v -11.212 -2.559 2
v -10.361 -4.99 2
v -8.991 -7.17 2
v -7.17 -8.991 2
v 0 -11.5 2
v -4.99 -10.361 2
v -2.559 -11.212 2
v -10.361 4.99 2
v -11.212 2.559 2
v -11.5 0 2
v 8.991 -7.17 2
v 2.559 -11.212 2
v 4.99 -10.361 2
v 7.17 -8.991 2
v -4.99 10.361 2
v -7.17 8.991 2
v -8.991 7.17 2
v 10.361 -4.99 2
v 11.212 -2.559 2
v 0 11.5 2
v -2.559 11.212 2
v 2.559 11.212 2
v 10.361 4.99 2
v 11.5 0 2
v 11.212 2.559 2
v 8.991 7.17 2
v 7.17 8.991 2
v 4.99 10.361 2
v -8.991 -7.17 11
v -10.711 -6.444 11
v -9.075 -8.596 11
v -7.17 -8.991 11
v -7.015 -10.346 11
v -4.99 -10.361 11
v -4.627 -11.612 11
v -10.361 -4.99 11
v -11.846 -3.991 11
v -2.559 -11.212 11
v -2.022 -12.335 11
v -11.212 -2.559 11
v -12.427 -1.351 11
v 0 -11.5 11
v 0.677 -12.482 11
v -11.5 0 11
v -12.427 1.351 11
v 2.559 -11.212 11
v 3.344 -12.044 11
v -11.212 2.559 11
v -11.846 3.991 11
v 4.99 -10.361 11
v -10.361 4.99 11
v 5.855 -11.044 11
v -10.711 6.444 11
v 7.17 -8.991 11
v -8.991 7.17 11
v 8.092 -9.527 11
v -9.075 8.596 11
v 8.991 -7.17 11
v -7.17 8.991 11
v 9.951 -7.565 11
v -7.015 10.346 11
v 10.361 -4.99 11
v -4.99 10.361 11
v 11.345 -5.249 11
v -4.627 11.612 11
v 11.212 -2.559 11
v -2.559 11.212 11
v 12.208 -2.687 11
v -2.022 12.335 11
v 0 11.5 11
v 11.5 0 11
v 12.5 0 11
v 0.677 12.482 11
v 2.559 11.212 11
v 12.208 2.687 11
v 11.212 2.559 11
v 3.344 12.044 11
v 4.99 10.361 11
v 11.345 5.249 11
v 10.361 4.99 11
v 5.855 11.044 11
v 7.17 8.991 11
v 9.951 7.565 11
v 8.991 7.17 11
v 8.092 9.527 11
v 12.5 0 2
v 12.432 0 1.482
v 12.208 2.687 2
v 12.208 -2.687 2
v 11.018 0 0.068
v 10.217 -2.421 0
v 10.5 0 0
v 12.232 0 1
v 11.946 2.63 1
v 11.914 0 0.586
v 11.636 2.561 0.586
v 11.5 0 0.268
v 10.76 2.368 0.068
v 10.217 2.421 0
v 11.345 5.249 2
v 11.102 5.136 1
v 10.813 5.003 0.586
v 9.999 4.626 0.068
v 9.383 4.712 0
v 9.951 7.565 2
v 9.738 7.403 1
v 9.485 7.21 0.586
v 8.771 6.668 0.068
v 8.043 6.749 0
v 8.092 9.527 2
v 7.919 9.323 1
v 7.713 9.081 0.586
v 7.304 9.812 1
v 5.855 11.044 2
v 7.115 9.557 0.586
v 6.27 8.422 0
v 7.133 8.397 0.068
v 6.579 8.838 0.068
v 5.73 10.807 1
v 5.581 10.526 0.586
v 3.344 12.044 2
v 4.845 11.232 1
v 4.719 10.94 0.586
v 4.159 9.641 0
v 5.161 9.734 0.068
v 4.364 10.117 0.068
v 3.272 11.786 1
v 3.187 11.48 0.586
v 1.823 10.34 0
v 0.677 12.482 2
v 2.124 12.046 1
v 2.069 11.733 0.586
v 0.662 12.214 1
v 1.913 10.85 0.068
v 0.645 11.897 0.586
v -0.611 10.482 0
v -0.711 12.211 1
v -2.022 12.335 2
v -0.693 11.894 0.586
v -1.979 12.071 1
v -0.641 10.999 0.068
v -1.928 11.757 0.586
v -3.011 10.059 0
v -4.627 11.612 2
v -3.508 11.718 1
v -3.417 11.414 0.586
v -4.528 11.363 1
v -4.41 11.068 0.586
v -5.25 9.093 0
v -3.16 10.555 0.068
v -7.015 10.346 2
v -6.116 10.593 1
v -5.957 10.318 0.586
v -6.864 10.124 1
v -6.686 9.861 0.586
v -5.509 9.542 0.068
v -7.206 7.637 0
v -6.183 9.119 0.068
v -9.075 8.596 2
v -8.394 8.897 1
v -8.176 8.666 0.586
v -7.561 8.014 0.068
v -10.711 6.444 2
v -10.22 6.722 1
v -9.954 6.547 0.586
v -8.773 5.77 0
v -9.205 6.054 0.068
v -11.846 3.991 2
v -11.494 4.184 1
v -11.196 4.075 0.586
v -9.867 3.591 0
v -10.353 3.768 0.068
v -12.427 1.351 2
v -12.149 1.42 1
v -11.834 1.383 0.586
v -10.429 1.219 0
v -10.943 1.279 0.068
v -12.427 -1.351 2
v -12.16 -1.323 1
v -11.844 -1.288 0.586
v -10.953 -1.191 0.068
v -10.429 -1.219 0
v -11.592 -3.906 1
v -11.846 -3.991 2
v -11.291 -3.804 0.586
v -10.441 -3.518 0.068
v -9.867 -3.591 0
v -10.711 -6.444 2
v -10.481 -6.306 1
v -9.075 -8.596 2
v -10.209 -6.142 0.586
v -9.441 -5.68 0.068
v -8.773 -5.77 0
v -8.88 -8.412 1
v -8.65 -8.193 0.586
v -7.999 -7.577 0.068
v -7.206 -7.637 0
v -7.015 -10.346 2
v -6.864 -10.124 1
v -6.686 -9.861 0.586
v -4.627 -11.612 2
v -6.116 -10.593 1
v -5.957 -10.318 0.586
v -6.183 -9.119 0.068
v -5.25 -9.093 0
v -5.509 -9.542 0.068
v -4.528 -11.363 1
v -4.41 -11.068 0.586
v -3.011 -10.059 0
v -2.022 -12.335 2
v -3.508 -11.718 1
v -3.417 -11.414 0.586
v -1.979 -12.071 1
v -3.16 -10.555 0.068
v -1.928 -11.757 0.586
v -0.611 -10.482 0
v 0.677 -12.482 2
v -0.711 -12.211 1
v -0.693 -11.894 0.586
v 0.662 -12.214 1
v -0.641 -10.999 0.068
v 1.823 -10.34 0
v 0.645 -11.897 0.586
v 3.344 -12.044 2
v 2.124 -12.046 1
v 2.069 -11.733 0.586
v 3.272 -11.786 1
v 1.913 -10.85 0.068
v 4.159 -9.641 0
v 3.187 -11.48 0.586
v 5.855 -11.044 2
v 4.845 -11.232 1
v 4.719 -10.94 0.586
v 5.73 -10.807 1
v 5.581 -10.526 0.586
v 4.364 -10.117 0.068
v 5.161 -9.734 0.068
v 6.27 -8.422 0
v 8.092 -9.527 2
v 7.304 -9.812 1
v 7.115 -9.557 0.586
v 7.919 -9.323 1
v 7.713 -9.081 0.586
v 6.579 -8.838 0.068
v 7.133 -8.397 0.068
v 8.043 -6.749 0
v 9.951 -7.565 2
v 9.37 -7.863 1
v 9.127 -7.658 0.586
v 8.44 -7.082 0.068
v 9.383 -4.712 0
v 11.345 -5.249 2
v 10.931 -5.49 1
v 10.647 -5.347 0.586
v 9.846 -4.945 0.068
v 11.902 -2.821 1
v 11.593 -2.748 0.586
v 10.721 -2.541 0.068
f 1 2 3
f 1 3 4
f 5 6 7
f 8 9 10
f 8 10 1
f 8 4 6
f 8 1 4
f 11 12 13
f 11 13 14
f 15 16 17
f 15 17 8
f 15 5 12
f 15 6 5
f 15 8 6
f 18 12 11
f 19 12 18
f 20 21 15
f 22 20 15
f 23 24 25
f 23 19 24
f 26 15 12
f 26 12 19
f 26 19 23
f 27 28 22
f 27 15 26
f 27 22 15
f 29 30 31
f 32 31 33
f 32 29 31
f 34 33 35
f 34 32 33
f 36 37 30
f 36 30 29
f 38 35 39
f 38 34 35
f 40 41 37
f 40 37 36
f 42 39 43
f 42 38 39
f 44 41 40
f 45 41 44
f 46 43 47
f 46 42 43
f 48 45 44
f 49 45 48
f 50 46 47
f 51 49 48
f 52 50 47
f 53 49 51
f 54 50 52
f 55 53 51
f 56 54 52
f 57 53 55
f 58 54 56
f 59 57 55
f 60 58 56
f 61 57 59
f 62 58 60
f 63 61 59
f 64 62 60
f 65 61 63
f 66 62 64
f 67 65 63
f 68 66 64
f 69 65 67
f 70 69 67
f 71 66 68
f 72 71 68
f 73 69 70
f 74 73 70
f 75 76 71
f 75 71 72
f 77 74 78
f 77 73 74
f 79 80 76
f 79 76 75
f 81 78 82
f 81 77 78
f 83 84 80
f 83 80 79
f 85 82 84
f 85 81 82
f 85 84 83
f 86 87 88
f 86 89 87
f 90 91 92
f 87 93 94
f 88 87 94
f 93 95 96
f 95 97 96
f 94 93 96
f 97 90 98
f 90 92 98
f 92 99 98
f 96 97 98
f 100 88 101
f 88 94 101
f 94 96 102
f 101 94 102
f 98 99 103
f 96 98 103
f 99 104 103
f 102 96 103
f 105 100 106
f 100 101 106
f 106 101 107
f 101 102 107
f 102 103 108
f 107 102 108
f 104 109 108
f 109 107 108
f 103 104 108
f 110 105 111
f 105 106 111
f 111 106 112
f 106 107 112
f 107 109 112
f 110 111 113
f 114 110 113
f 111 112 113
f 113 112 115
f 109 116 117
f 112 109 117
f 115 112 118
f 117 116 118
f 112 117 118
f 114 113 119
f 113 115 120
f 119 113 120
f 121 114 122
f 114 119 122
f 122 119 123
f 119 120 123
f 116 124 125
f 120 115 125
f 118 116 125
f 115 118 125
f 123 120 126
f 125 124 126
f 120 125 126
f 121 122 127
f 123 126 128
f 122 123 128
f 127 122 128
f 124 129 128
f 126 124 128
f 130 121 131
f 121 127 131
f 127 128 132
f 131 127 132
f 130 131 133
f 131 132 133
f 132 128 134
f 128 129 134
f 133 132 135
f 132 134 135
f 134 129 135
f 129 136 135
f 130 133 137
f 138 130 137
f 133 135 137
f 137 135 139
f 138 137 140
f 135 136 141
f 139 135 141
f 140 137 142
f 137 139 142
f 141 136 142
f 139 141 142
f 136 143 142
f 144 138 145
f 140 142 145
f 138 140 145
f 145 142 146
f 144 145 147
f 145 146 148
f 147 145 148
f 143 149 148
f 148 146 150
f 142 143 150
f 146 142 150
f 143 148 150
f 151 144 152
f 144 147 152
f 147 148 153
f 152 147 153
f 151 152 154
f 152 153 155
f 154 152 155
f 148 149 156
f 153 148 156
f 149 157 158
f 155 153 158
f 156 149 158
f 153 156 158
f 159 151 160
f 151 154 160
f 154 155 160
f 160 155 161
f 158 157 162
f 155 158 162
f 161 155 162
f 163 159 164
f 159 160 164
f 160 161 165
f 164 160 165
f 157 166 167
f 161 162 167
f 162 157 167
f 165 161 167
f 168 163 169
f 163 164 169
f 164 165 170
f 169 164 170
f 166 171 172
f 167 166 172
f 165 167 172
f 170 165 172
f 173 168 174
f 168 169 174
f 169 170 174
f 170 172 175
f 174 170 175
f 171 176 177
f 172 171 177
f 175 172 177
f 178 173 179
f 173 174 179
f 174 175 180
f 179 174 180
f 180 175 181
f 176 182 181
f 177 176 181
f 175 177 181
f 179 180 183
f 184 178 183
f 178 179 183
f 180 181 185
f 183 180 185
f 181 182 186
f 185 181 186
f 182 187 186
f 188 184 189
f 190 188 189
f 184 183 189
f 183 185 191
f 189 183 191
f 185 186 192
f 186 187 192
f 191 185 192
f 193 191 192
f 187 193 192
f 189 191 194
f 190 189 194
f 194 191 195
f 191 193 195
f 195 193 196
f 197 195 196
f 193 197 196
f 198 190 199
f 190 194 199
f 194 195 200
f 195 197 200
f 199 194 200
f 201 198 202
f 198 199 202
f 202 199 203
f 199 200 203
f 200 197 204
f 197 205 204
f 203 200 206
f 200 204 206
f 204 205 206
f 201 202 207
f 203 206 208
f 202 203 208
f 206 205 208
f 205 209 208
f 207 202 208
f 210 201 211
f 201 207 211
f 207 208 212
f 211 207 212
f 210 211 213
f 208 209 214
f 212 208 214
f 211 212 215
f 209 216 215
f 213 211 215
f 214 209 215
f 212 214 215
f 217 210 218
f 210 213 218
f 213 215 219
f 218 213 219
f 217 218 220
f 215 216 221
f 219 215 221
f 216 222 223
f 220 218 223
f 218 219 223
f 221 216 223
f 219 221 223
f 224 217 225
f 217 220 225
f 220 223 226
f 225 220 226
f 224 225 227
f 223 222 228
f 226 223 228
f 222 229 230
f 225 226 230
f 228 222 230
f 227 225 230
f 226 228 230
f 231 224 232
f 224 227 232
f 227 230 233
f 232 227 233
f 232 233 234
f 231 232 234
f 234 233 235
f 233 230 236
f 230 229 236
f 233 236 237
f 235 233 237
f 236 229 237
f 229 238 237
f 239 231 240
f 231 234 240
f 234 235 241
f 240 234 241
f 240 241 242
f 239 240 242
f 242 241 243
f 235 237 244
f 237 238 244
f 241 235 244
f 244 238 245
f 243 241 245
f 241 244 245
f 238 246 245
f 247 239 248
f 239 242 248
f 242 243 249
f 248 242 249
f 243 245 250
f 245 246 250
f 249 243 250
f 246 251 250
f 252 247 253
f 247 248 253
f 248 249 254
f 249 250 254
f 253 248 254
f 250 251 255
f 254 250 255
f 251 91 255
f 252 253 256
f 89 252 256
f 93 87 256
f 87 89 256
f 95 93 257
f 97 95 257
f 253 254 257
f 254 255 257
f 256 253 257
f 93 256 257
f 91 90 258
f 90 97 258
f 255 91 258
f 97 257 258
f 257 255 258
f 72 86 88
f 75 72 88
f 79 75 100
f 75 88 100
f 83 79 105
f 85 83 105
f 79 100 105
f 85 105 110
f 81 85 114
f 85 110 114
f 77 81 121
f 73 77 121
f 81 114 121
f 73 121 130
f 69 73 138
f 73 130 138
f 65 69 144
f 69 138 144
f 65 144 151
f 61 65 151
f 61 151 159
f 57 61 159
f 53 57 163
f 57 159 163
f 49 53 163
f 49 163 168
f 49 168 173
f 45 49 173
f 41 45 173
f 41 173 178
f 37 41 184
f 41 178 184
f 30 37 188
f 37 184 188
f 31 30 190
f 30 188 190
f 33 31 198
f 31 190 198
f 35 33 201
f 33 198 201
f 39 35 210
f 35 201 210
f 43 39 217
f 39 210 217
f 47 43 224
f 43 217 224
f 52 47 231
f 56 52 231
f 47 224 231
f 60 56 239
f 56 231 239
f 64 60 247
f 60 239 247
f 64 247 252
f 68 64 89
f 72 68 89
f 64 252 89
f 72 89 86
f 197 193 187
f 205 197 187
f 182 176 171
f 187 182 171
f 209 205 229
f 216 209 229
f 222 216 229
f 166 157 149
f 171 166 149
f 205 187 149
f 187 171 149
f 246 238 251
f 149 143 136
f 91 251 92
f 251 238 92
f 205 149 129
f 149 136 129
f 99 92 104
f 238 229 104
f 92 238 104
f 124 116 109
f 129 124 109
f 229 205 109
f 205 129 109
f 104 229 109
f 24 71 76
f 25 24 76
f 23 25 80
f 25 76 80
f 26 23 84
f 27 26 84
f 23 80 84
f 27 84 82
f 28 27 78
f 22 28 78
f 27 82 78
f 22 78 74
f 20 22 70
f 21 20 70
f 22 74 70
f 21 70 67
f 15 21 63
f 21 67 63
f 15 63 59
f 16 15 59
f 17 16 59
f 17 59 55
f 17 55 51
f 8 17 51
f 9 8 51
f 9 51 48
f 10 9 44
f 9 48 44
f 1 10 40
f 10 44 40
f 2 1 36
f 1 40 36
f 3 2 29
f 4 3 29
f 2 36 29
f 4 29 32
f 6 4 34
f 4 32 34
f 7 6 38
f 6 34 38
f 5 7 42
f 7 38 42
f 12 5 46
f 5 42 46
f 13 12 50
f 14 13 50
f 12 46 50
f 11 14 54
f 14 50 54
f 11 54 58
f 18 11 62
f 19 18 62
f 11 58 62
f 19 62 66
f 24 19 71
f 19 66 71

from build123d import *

# Parameters (mm, degrees)
F0_R     = 12.5
F1_DEPTH = 11
F2_R     = 11.5
F3_DEPTH = 9
F4_R     = 2


with BuildPart() as f1:
    # F0 (on Top) → F1 (new body)
    with BuildSketch(Plane.XY):
        Circle(F0_R)
    extrude(amount=F1_DEPTH)

    # F2 (on face) → F3 (cut)
    with BuildSketch(Plane.XY.offset(11)):
        Circle(F2_R)
    extrude(amount=-F3_DEPTH, mode=Mode.SUBTRACT)

    # F4
    f4_edges = [f1.edges().sort_by_distance(p)[0] for p in [
        (-12.5, 0, 0),
    ]]
    fillet(f4_edges, radius=F4_R)


solid = f1.part
